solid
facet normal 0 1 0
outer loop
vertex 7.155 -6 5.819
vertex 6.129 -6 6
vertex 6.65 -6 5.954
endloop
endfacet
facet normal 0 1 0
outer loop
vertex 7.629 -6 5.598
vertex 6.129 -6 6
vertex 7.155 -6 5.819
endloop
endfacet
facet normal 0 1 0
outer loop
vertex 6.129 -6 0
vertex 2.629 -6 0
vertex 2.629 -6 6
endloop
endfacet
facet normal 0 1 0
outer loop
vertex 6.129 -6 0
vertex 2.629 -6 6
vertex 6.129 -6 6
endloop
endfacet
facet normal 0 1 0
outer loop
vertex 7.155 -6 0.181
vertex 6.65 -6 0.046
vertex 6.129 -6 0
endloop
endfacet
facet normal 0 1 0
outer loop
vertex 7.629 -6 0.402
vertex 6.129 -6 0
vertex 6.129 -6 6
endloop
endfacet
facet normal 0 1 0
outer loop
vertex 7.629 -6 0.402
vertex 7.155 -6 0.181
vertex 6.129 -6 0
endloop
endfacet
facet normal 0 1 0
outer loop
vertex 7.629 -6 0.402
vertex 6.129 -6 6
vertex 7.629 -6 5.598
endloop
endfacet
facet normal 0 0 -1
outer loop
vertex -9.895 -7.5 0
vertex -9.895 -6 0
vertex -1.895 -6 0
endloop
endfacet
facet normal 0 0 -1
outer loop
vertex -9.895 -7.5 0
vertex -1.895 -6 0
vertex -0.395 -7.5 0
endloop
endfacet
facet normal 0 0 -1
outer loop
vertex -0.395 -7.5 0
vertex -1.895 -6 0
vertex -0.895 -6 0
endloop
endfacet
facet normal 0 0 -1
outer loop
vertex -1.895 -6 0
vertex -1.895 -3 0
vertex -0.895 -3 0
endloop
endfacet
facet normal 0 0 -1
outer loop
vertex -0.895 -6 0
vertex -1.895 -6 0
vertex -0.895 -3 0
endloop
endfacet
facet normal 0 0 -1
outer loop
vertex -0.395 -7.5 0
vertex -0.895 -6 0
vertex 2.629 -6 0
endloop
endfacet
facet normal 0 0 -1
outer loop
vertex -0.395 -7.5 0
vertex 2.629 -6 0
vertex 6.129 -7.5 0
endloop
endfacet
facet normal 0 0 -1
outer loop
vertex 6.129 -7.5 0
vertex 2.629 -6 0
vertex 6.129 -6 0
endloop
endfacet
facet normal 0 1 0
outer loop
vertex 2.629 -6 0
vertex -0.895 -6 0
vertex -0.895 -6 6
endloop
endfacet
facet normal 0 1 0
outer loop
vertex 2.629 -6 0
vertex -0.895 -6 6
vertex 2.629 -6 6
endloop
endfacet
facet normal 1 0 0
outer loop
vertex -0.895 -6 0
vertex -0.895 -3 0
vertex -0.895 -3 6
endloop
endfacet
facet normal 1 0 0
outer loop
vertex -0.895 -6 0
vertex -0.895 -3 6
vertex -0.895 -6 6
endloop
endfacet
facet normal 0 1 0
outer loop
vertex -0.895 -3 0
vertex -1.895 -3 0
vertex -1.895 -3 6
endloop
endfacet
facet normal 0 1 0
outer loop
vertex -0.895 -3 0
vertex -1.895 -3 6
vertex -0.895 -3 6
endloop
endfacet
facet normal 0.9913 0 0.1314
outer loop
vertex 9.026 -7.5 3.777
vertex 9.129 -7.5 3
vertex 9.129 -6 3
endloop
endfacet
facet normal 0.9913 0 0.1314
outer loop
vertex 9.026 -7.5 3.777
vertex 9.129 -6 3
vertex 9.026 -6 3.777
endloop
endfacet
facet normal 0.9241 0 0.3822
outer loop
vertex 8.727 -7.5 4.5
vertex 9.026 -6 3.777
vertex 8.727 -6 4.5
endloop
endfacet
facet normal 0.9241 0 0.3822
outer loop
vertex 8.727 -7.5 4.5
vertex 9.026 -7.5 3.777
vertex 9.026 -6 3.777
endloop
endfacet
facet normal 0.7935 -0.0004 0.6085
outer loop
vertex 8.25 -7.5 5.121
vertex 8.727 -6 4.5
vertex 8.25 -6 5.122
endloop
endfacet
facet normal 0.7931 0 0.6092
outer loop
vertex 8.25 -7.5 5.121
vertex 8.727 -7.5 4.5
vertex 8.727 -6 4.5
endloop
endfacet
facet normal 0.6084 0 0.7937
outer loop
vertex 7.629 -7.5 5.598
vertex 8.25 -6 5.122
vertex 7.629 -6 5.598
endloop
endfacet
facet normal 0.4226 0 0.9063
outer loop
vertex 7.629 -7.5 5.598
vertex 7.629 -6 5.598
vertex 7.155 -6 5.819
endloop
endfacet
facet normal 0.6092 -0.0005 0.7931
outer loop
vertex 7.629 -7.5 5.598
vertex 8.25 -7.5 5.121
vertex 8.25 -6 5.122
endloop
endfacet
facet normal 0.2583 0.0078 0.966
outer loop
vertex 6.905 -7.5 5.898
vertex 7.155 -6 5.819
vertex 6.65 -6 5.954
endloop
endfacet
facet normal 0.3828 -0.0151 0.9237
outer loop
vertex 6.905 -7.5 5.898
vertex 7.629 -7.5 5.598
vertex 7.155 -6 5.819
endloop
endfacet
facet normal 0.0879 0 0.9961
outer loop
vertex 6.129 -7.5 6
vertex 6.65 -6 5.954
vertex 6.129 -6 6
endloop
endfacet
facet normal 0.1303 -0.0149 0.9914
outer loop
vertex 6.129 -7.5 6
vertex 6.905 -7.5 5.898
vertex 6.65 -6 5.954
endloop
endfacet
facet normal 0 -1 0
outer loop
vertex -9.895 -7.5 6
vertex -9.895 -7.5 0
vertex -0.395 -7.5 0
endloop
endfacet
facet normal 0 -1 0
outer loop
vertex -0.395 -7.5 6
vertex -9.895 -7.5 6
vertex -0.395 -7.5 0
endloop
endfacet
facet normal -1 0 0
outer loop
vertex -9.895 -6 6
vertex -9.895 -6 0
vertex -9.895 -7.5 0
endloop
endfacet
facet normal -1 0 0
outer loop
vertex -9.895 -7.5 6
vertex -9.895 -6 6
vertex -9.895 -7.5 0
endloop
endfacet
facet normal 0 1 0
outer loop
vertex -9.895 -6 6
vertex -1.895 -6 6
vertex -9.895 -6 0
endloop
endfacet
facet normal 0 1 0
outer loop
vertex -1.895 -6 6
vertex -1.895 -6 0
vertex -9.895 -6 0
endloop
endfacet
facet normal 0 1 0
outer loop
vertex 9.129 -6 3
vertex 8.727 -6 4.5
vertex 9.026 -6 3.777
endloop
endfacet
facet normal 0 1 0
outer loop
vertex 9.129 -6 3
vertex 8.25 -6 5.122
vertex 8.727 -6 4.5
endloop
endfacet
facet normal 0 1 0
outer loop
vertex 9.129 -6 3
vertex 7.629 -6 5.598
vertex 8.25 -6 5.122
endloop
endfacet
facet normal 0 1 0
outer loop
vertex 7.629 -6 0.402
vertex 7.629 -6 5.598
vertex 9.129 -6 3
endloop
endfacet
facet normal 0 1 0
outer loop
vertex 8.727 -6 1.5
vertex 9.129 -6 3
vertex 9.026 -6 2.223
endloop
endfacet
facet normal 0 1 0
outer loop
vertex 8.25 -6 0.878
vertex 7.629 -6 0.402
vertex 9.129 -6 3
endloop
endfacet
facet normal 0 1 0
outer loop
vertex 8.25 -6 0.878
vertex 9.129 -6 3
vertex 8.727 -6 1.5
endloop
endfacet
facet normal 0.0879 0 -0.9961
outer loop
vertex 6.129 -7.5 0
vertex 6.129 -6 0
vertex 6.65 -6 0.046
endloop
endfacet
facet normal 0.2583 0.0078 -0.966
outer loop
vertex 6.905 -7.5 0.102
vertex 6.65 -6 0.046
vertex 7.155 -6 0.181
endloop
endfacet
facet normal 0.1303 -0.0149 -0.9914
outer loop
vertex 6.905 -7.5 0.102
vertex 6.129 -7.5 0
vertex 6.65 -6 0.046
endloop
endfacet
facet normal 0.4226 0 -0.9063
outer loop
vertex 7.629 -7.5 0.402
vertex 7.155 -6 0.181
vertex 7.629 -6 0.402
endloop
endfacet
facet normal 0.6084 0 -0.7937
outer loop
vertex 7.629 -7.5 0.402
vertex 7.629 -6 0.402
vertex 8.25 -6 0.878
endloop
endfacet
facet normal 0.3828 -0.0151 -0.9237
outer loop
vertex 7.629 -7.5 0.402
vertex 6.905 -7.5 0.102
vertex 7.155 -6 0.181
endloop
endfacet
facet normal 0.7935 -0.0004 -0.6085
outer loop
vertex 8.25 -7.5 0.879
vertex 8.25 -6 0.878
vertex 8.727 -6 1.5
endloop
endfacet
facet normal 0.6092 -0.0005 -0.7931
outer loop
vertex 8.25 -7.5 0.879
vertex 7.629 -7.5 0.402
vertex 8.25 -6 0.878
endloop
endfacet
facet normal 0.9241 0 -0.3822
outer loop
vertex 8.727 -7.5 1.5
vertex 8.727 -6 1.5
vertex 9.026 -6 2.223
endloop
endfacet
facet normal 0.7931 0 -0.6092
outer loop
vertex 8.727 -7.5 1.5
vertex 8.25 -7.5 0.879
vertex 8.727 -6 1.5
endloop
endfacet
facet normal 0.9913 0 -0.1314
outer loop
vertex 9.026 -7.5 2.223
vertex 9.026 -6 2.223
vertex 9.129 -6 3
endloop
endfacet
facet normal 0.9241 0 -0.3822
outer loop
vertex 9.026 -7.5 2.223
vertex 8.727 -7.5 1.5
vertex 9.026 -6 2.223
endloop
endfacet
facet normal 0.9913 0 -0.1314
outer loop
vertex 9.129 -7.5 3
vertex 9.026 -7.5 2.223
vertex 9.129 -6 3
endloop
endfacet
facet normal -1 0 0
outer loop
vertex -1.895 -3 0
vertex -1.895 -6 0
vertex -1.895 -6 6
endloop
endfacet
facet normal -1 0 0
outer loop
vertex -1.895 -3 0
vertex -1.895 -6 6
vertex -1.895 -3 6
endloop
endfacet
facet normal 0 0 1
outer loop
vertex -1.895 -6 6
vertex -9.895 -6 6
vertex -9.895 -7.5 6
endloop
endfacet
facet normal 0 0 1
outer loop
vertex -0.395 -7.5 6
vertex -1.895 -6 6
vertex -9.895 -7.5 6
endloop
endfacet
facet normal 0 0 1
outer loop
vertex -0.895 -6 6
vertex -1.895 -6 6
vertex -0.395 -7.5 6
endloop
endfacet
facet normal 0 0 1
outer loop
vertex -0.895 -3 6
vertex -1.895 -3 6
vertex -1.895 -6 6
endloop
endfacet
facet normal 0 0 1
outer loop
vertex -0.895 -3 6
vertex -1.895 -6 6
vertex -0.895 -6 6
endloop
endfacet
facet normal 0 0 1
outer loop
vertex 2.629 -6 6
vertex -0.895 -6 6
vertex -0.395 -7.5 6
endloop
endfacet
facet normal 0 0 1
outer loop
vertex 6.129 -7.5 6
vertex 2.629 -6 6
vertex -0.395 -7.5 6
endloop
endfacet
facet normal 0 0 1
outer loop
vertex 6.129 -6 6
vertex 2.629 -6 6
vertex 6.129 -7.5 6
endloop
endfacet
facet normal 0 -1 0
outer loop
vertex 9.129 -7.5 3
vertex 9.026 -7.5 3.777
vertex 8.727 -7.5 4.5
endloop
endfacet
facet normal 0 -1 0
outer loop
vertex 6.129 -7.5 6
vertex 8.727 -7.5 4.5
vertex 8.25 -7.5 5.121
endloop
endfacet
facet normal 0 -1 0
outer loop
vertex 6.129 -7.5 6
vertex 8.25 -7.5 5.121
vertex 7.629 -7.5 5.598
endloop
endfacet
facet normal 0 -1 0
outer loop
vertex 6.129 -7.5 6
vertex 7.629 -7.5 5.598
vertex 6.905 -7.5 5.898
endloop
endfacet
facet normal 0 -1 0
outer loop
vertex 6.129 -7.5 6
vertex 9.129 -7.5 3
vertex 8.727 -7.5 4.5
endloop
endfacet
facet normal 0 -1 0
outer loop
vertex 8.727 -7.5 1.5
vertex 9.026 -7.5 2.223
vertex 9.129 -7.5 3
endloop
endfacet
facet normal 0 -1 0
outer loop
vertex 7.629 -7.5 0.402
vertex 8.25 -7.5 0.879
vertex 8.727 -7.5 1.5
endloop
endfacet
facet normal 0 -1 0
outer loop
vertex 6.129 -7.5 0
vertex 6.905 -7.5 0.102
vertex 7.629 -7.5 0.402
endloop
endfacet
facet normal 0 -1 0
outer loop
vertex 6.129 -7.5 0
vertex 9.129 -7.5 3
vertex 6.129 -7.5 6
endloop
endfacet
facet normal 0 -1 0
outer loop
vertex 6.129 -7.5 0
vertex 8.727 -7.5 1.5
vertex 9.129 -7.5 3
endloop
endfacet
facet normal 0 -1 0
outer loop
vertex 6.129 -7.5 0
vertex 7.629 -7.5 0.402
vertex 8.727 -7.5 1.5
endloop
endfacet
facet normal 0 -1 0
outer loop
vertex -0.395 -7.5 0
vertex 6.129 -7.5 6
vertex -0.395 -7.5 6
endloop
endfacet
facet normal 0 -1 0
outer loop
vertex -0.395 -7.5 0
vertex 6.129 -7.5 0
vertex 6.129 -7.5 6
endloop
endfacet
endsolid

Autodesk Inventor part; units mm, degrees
ref_plane "YZ Plane" through (0, 0, 0) normal (1, 0, 0) x (0, 1, 0)
ref_plane "XZ Plane" through (0, 0, 0) normal (0, 1, 0) x (-1, 0, 0)
ref_plane "XY Plane" through (0, 0, 0) normal (0, 0, 1) x (1, 0, 0)
sketch "草圖1" plane through (0, 0, 0) normal (0, 0, 1) x (1, 0, 0)
  line L0 (-1.8649, 0) -> (-1.8649, -6) construction
  line L1 (-1.8649, -6) -> (-0.9249, -6) construction
  line L2 (-1.8649, 0) -> (-1.8649, -6) construction
  line L3 (-0.9249, 0) -> (0, 0) projected
  line L4 (-0.9249, 0) -> (-0.9249, -6) construction
  line L5 (2.6286, 0) -> (2.6286, -6)
  line L6 (2.6286, -6) -> (7.6286, -6) projected
  line L7 (7.6286, 0) -> (7.6286, -6)
  line L8 (-1.8949, -3) -> (-0.8949, -3)
  line L9 (-0.8949, -3) -> (-0.8949, -6)
  line L10 (-0.8949, -6) -> (9.1286, -6)
  line L11 (9.1286, -6) -> (9.1286, -7.5)
  line L12 (9.1286, -7.5) -> (-0.3949, -7.5)
  line L13 (-0.3949, -7.5) -> (-0.3949, -20.2) construction
  line L14 (-0.3949, -20.2) -> (-9.8949, -20.2) construction
  line L15 (-9.8949, -20.2) -> (-9.8949, -19)
  line L16 (-9.8949, -19) -> (-1.8949, -19) construction
  line L17 (-1.8949, -6) -> (-9.8949, -6)
  line L18 (-9.8949, -6) -> (-9.8949, -7.5)
  line L19 (-9.8949, -7.5) -> (-0.3949, -7.5)
  line L20 (-1.8949, -19) -> (-1.8949, -7.5) construction
  line L21 (-1.8949, -6) -> (-1.8949, -3)
  dimension "d0" = 1
  dimension "d2" = 1.5
  dimension "d3" = 16
  dimension "d4" = 1.5
  dimension "d6" = 8
  dimension "d7" = 1.2
  dimension "d11" = 3
extrude "擠出1" add sketch "草圖1" along normal blind 6
fillet "圓角1" radius 3 2 edges at (9.1286, -6.75, 6) (9.1286, -6.75, 0)
sketch "草圖2" plane through (-0.8949, -6, 6) normal (0, 1, 0) x (1, 0, 0)
  circle A0 centre (4.97, 3) radius 1.5 projected
  point P0 (0.8949, 6)
extrude "擠出2" [suppressed]
sketch "草圖3" plane through (-9.8949, -7.5, 0) normal (-1, 0, 0) x (0, 0, 1)
  line L0 (0, 1.5) -> (0, 0) projected
  line L1 (0, 0) -> (6, 0) projected
  line L2 (6, 1.5) -> (6, 0) projected
  line L3 (0, 1.5) -> (6, 1.5) projected
  line L4 (3, 0) -> (3, -6.212)
  line L5 (3, -6.212) -> (0.8685, -6.212)
  line L6 (0.8685, -6.212) -> (0.8685, -7.3106)
  line L7 (0.8685, -7.3106) -> (6, -7.3106)
  line L8 (6, -7.3106) -> (6, 0)
  point P0 (0, 7.5)
properties part number "j1 endstop block"
